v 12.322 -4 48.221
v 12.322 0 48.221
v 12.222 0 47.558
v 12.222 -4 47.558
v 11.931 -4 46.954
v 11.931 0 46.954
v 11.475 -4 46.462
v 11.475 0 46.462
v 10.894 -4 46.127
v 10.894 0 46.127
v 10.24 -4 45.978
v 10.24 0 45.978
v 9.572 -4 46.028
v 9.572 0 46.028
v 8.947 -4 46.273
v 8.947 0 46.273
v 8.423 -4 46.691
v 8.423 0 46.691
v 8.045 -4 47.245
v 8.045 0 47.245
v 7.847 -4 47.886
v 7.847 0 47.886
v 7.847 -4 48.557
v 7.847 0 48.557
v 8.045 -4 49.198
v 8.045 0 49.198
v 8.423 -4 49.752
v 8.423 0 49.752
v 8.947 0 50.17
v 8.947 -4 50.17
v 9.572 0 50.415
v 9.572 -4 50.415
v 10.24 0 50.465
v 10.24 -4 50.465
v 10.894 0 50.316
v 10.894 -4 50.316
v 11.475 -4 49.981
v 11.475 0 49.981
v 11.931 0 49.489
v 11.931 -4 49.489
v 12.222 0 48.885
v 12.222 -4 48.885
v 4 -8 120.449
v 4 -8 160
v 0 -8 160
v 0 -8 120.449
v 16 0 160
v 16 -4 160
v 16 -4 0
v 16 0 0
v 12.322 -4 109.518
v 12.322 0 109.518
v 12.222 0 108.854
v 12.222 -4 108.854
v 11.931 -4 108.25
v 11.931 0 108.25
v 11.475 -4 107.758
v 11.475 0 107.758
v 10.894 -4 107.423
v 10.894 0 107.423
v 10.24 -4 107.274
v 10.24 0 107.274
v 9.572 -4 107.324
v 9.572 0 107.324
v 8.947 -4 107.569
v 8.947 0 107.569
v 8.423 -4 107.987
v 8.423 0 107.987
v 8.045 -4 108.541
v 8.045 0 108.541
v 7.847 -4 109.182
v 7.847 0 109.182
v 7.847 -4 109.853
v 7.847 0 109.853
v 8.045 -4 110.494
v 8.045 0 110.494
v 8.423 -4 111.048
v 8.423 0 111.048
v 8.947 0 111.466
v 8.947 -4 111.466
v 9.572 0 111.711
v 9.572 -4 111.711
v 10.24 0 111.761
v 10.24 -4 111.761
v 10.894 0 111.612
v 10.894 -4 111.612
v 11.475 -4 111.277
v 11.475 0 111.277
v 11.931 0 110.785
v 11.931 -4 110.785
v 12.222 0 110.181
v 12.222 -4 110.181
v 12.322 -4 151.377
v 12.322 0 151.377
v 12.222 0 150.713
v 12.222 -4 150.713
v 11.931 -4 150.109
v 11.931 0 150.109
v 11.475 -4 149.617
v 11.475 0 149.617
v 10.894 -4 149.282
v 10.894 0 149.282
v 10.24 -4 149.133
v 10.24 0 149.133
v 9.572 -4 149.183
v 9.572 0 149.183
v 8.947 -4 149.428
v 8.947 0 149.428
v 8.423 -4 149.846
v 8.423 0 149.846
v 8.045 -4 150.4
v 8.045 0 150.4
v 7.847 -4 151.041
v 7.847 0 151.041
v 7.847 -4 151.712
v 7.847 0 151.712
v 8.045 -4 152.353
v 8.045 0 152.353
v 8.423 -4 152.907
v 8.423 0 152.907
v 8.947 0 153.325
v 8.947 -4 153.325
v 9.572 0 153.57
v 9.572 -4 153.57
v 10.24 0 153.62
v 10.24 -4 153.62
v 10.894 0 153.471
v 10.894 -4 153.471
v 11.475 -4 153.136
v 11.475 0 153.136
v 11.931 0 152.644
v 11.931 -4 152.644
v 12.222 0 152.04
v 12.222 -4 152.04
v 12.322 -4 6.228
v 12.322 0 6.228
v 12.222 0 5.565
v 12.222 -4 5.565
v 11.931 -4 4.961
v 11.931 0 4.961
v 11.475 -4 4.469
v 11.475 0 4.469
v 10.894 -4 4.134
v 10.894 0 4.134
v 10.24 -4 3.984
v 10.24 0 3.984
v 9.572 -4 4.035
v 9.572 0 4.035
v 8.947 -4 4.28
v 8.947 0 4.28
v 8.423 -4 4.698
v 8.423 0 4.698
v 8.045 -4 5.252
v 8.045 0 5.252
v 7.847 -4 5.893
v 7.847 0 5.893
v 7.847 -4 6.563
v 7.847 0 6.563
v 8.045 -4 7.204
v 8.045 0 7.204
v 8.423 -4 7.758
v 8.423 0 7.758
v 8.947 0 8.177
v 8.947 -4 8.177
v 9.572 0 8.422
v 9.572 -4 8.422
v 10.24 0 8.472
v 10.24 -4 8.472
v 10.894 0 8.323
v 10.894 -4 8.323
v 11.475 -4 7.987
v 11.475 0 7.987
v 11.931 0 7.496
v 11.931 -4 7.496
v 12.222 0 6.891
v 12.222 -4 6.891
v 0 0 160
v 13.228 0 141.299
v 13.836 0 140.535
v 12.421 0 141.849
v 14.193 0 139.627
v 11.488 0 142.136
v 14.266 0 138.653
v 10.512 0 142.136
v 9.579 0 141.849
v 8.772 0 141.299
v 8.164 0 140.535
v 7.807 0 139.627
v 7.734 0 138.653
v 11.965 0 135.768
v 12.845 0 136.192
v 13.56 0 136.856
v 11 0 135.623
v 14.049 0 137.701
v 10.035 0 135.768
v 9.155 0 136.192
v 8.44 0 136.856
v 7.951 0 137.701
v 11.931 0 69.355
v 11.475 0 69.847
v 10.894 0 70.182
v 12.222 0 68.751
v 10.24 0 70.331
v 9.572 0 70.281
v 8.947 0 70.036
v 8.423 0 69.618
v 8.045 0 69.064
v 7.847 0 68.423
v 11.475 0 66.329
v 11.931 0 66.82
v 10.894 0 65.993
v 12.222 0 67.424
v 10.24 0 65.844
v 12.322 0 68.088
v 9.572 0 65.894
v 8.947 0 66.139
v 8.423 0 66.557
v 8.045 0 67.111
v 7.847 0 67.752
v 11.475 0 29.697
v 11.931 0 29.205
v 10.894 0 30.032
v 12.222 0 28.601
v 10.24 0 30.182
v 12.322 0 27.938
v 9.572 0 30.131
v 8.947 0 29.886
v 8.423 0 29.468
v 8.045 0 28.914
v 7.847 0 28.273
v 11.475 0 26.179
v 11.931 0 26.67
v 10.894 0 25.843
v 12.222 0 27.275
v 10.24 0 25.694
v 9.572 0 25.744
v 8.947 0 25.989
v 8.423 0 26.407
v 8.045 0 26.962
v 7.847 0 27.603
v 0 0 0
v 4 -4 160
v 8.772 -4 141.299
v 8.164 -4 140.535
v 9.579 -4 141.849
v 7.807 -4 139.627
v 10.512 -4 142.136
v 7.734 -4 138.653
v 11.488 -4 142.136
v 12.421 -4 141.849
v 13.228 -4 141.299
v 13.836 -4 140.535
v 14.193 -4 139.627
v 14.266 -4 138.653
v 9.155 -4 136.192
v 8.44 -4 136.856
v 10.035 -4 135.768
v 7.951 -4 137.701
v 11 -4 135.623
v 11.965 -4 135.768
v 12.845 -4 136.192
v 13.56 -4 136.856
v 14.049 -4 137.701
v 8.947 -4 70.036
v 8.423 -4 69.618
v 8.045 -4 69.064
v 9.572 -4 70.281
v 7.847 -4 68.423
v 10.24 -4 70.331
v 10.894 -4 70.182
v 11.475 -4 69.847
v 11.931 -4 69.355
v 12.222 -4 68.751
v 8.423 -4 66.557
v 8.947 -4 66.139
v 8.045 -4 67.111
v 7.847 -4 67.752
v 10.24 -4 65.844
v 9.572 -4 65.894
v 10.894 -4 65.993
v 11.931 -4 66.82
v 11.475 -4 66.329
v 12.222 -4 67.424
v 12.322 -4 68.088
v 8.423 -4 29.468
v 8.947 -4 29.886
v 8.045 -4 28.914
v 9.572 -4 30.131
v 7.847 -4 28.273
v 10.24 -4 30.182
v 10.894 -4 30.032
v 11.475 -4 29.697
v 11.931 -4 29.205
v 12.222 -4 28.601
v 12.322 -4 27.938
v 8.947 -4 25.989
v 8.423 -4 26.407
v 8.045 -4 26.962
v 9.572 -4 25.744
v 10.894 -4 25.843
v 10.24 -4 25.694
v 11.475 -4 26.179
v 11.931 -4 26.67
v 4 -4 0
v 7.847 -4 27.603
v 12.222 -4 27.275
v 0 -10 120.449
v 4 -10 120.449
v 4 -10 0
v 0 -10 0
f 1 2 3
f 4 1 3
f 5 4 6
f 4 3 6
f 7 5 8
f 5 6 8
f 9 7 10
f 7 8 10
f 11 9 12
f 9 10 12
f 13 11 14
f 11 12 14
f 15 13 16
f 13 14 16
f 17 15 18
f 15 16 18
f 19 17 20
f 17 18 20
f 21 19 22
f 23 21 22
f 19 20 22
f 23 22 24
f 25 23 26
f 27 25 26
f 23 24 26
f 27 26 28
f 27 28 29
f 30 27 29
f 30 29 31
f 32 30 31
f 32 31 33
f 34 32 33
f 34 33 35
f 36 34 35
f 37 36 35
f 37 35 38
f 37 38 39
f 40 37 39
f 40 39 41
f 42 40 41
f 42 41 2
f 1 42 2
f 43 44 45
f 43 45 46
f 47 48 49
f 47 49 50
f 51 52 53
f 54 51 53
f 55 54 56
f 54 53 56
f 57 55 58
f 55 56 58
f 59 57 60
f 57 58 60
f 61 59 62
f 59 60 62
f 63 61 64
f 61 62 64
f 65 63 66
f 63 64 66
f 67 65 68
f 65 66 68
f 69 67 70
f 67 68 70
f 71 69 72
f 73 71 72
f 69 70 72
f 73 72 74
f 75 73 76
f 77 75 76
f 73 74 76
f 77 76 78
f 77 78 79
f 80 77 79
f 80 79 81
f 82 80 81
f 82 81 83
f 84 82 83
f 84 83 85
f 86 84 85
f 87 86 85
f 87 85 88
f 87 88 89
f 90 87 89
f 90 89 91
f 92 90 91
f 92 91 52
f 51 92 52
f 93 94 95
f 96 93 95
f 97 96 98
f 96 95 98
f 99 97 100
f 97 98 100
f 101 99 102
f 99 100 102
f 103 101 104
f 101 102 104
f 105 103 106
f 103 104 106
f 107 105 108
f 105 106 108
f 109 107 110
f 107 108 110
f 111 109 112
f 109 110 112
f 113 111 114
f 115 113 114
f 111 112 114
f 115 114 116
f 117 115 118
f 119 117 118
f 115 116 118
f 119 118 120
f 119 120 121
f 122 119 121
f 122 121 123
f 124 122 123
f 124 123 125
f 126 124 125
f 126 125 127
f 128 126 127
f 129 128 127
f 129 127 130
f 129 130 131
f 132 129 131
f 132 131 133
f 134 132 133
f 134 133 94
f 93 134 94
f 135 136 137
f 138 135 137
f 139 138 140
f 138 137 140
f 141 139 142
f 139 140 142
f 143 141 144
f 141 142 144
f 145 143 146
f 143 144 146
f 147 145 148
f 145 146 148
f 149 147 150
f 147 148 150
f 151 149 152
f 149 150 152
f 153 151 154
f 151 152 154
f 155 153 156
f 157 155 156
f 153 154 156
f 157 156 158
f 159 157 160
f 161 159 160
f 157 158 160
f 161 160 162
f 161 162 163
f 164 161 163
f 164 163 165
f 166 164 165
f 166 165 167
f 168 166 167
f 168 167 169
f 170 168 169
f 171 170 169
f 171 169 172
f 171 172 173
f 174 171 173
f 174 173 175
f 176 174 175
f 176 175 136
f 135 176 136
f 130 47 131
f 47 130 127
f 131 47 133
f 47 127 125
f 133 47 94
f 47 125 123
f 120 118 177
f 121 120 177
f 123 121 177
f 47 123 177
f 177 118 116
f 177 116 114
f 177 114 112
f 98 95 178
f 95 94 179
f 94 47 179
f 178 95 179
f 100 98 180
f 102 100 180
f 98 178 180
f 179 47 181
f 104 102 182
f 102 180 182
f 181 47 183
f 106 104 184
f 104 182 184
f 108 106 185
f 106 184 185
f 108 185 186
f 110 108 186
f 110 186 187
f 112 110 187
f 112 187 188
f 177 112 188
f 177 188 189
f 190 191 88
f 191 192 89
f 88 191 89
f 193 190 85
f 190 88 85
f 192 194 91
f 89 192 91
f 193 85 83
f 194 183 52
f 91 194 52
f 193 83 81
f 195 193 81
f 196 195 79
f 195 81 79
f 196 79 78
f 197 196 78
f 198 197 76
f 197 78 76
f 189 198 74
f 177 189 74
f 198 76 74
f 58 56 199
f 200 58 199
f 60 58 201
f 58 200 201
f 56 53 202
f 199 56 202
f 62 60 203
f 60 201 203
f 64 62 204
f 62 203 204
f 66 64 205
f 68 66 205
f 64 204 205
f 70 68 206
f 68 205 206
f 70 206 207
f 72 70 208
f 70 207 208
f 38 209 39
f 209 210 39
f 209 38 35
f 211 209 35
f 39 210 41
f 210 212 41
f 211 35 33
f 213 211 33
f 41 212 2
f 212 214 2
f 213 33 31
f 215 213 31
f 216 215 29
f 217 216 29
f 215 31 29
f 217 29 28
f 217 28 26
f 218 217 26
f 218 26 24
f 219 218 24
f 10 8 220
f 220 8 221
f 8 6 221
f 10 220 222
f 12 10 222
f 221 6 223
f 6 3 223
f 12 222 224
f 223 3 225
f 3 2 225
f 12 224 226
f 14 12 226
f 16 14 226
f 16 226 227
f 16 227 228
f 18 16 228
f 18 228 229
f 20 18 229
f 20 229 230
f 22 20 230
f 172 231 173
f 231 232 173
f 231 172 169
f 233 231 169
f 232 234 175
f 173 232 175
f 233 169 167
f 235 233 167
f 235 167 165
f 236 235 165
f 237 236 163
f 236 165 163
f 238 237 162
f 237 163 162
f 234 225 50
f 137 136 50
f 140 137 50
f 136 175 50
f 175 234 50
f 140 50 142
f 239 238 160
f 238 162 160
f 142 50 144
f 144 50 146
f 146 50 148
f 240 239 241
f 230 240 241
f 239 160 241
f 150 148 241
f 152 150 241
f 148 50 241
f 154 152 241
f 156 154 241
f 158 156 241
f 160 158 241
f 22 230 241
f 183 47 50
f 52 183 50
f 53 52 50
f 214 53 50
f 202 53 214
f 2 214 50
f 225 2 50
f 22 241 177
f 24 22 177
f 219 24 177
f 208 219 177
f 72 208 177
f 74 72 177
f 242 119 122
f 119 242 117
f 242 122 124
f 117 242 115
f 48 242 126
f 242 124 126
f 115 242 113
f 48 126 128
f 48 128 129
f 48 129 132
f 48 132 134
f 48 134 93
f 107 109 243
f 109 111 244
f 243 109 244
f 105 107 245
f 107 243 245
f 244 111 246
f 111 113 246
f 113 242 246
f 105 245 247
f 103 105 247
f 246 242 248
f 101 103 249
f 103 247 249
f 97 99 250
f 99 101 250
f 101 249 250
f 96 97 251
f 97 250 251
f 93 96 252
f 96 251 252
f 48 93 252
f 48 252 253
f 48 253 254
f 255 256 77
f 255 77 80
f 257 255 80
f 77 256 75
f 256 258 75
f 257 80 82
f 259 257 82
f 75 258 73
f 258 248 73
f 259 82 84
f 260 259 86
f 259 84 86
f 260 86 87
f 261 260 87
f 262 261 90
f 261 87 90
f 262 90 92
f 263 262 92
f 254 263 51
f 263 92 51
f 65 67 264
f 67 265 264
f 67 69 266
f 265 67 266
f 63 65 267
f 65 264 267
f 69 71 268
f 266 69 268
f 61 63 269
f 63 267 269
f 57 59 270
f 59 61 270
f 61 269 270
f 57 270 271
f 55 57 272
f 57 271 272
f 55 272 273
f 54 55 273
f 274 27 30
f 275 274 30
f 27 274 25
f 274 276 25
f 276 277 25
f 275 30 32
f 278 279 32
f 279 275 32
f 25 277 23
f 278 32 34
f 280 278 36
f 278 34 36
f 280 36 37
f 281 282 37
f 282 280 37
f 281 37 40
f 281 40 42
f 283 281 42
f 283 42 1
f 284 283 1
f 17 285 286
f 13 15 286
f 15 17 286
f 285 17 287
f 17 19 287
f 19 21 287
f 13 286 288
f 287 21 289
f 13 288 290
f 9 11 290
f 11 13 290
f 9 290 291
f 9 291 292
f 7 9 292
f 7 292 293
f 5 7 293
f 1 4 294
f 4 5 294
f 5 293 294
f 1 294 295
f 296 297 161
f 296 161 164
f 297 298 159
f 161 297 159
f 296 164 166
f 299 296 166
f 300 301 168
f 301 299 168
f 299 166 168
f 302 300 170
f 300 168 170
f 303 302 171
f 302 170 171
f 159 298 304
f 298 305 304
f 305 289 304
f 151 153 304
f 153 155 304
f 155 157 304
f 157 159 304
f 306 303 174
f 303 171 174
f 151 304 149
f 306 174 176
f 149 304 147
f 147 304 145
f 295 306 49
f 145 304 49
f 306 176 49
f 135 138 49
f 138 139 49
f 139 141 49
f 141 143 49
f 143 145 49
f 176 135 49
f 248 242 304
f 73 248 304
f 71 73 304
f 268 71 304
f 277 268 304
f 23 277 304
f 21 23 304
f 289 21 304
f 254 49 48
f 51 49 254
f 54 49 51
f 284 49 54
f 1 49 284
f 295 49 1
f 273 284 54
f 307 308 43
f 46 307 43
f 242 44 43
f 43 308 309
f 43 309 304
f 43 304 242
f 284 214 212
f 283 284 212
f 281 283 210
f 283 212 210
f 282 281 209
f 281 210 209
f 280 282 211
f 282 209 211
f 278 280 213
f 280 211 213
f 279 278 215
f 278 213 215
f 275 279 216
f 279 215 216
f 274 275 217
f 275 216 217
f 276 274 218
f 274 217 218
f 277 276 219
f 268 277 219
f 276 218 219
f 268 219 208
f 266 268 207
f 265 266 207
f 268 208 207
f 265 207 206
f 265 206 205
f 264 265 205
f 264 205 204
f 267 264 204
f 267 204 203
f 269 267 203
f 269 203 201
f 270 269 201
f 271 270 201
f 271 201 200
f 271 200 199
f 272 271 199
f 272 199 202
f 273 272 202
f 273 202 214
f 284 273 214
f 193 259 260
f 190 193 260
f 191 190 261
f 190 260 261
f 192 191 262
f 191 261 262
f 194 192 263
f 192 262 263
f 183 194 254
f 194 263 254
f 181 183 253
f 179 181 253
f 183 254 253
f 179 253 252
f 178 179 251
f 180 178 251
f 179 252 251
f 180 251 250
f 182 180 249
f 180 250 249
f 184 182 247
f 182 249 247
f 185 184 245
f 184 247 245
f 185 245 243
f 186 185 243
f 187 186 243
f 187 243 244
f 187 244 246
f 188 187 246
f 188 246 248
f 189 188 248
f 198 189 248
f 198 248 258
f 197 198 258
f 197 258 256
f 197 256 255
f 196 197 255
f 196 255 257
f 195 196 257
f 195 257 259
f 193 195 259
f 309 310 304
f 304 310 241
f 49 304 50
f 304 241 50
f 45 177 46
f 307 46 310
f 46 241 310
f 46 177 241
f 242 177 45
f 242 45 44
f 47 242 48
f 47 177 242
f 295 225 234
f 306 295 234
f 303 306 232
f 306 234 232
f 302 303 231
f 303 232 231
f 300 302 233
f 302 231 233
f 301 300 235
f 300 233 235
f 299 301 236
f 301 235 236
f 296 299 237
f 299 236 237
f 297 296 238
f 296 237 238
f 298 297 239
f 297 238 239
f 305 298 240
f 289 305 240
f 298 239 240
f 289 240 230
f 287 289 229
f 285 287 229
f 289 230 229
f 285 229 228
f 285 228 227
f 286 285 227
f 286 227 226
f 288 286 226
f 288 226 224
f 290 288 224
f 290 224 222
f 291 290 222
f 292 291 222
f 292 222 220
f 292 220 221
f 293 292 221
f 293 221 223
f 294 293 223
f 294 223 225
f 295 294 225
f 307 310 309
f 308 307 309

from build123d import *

# Parameters (mm, degrees)
BOSS_EXTRUDE1_DEPTH  = 160
SKETCH2_W            = 39.551056564
SKETCH2_H            = 2
CUT_EXTRUDE1_DEPTH   = 4
M4_CLEARANCE_HOLE1_D = 4.5
SKETCH5_R            = 3.275
CUT_EXTRUDE2_DEPTH   = 10


with BuildPart() as part:
    # Sketch1 → Boss-Extrude1 (new body)
    with BuildSketch(Plane.XY):
        Polygon((0, 0), (0, -10), (4, -10), (4, -4), (16, -4), (16, 0), align=None)
    extrude(amount=BOSS_EXTRUDE1_DEPTH)

    # Sketch2 → Cut-Extrude1 (cut)
    with BuildSketch(Plane(origin=(4, 0, 0), x_dir=(0, 0, -1), z_dir=(1, 0, 0))):
        with Locations((-140.224471718, -9)):
            Rectangle(SKETCH2_W, SKETCH2_H)
    extrude(amount=-CUT_EXTRUDE1_DEPTH, mode=Mode.SUBTRACT)

    # M4 Clearance Hole1 (through all)
    with Locations(Plane(origin=(0, -4, 0), x_dir=(-1, 0, 0), z_dir=(0, -1, 0))):
        with Locations((-10.072352995, -6.228090532), (-10.072352995, -27.937872474), (-10.072352995, -48.221464361), (-10.072352995, -68.087621842), (-10.072352995, -109.517546491), (-10.072352995, -151.376567413)):
            Hole(M4_CLEARANCE_HOLE1_D / 2)

    # Sketch5 → Cut-Extrude2 (cut)
    with BuildSketch(Plane.XZ.offset(4)):
        with Locations(Location((11, 138.897931951, 0), (0, 0, 270))):
            Circle(SKETCH5_R)
    extrude(amount=-CUT_EXTRUDE2_DEPTH, mode=Mode.SUBTRACT)


solid = part.part
